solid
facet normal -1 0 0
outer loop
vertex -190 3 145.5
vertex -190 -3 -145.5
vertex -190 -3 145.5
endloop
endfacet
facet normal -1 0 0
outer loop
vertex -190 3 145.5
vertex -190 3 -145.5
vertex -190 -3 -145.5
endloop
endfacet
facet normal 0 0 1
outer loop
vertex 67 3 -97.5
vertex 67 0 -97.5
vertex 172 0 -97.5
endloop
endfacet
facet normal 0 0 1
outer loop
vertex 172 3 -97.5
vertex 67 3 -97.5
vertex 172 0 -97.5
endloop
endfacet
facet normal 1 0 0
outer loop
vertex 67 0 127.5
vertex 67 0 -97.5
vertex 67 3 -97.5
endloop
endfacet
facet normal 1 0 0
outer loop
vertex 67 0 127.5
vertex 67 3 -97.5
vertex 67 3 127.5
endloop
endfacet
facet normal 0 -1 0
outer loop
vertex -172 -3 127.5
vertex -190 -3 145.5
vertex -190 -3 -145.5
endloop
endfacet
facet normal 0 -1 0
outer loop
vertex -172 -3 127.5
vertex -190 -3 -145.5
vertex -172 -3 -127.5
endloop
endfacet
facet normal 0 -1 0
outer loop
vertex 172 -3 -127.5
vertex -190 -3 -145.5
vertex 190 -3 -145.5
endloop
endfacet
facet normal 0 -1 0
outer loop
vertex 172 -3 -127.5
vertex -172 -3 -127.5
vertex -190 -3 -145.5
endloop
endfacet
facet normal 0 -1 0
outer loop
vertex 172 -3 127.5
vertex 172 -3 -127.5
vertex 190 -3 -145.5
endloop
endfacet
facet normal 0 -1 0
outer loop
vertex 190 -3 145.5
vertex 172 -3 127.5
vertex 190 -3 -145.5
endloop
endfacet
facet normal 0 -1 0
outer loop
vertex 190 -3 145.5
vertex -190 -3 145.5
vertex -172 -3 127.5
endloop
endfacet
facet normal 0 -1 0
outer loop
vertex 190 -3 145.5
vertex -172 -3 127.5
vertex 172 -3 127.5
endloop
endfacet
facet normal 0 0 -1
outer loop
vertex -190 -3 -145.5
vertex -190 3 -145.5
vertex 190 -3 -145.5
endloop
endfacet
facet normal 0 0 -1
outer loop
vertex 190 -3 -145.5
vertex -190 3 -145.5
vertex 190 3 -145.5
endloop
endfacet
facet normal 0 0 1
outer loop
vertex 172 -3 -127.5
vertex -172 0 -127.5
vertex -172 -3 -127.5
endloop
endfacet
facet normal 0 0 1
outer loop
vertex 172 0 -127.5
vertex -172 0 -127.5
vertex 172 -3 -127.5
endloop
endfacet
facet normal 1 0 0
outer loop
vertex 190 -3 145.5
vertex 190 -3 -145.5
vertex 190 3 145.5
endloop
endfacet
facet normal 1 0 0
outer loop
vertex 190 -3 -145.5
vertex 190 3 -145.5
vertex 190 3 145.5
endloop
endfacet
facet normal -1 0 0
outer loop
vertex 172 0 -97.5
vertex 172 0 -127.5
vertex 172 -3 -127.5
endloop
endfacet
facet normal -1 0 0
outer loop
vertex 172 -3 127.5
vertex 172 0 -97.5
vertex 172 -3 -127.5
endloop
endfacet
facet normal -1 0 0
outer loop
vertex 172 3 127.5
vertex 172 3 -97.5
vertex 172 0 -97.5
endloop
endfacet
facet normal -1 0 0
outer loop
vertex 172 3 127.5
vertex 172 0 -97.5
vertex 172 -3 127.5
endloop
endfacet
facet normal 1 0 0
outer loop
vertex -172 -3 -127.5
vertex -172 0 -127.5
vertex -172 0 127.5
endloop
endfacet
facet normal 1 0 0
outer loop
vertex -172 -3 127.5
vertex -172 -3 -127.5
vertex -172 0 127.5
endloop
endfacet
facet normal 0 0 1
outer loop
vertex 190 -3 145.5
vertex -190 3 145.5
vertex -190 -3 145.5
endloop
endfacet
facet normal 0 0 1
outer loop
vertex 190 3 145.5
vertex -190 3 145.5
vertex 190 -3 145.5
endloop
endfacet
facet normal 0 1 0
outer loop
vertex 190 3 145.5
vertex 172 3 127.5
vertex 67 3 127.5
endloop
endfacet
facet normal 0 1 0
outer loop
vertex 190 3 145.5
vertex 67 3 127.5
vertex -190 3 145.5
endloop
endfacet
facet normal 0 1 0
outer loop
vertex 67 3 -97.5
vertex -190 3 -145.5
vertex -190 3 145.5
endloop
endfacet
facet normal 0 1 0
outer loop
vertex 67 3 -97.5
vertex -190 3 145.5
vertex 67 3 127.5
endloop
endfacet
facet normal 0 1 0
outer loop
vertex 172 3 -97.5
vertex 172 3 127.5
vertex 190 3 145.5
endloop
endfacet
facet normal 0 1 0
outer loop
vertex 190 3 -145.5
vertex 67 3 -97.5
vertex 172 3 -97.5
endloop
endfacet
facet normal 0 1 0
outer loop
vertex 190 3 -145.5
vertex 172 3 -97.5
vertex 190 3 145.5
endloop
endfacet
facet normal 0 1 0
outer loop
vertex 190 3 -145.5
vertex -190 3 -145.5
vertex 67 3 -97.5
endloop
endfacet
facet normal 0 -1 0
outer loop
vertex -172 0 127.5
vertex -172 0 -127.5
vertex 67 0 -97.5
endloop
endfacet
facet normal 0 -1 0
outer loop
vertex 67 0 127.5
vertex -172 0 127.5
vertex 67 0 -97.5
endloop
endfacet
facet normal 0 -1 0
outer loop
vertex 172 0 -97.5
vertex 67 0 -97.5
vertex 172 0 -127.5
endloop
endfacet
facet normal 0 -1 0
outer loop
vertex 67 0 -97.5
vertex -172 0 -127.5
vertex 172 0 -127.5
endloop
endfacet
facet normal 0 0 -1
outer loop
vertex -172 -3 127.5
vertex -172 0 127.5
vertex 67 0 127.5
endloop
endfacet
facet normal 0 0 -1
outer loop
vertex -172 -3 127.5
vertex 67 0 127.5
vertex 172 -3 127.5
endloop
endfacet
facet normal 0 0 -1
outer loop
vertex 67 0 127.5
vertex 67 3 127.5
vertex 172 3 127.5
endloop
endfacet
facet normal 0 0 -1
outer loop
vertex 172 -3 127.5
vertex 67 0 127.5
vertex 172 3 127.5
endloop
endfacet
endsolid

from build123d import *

# Parameters (mm, degrees)
SKETCH_1_W          = 380
SKETCH_1_H          = 291
EXTRUDE_1_DEPTH     = 3
SKETCH_2_W          = 380
SKETCH_2_H          = 291
SKETCH_2_W_2        = 344
SKETCH_2_H_2        = 255
EXTRUDE_3_DEPTH     = 3
SKETCH_7_W          = 105
SKETCH_7_H          = 225
CUT_EXTRUDE_1_DEPTH = 3


with BuildPart() as part:
    # Эскиз1 → Бобышка-Вытянуть1 (new body)
    with BuildSketch(Plane(origin=(0, 0, 0), x_dir=(1, 0, 0), z_dir=(0, 1, 0))):
        Rectangle(SKETCH_1_W, SKETCH_1_H)
    extrude(amount=EXTRUDE_1_DEPTH)

    # Эскиз2 → Бобышка-Вытянуть3 (add)
    with BuildSketch(Plane.XZ):
        Rectangle(SKETCH_2_W, SKETCH_2_H)
        Rectangle(SKETCH_2_W_2, SKETCH_2_H_2, mode=Mode.SUBTRACT)
    extrude(amount=EXTRUDE_3_DEPTH)

    # Эскиз7 → Вырез-Вытянуть1 (cut)
    with BuildSketch(Plane.XZ):
        with Locations((119.5, 15)):
            Rectangle(SKETCH_7_W, SKETCH_7_H)
    extrude(amount=-CUT_EXTRUDE_1_DEPTH, mode=Mode.SUBTRACT)


solid = part.part
